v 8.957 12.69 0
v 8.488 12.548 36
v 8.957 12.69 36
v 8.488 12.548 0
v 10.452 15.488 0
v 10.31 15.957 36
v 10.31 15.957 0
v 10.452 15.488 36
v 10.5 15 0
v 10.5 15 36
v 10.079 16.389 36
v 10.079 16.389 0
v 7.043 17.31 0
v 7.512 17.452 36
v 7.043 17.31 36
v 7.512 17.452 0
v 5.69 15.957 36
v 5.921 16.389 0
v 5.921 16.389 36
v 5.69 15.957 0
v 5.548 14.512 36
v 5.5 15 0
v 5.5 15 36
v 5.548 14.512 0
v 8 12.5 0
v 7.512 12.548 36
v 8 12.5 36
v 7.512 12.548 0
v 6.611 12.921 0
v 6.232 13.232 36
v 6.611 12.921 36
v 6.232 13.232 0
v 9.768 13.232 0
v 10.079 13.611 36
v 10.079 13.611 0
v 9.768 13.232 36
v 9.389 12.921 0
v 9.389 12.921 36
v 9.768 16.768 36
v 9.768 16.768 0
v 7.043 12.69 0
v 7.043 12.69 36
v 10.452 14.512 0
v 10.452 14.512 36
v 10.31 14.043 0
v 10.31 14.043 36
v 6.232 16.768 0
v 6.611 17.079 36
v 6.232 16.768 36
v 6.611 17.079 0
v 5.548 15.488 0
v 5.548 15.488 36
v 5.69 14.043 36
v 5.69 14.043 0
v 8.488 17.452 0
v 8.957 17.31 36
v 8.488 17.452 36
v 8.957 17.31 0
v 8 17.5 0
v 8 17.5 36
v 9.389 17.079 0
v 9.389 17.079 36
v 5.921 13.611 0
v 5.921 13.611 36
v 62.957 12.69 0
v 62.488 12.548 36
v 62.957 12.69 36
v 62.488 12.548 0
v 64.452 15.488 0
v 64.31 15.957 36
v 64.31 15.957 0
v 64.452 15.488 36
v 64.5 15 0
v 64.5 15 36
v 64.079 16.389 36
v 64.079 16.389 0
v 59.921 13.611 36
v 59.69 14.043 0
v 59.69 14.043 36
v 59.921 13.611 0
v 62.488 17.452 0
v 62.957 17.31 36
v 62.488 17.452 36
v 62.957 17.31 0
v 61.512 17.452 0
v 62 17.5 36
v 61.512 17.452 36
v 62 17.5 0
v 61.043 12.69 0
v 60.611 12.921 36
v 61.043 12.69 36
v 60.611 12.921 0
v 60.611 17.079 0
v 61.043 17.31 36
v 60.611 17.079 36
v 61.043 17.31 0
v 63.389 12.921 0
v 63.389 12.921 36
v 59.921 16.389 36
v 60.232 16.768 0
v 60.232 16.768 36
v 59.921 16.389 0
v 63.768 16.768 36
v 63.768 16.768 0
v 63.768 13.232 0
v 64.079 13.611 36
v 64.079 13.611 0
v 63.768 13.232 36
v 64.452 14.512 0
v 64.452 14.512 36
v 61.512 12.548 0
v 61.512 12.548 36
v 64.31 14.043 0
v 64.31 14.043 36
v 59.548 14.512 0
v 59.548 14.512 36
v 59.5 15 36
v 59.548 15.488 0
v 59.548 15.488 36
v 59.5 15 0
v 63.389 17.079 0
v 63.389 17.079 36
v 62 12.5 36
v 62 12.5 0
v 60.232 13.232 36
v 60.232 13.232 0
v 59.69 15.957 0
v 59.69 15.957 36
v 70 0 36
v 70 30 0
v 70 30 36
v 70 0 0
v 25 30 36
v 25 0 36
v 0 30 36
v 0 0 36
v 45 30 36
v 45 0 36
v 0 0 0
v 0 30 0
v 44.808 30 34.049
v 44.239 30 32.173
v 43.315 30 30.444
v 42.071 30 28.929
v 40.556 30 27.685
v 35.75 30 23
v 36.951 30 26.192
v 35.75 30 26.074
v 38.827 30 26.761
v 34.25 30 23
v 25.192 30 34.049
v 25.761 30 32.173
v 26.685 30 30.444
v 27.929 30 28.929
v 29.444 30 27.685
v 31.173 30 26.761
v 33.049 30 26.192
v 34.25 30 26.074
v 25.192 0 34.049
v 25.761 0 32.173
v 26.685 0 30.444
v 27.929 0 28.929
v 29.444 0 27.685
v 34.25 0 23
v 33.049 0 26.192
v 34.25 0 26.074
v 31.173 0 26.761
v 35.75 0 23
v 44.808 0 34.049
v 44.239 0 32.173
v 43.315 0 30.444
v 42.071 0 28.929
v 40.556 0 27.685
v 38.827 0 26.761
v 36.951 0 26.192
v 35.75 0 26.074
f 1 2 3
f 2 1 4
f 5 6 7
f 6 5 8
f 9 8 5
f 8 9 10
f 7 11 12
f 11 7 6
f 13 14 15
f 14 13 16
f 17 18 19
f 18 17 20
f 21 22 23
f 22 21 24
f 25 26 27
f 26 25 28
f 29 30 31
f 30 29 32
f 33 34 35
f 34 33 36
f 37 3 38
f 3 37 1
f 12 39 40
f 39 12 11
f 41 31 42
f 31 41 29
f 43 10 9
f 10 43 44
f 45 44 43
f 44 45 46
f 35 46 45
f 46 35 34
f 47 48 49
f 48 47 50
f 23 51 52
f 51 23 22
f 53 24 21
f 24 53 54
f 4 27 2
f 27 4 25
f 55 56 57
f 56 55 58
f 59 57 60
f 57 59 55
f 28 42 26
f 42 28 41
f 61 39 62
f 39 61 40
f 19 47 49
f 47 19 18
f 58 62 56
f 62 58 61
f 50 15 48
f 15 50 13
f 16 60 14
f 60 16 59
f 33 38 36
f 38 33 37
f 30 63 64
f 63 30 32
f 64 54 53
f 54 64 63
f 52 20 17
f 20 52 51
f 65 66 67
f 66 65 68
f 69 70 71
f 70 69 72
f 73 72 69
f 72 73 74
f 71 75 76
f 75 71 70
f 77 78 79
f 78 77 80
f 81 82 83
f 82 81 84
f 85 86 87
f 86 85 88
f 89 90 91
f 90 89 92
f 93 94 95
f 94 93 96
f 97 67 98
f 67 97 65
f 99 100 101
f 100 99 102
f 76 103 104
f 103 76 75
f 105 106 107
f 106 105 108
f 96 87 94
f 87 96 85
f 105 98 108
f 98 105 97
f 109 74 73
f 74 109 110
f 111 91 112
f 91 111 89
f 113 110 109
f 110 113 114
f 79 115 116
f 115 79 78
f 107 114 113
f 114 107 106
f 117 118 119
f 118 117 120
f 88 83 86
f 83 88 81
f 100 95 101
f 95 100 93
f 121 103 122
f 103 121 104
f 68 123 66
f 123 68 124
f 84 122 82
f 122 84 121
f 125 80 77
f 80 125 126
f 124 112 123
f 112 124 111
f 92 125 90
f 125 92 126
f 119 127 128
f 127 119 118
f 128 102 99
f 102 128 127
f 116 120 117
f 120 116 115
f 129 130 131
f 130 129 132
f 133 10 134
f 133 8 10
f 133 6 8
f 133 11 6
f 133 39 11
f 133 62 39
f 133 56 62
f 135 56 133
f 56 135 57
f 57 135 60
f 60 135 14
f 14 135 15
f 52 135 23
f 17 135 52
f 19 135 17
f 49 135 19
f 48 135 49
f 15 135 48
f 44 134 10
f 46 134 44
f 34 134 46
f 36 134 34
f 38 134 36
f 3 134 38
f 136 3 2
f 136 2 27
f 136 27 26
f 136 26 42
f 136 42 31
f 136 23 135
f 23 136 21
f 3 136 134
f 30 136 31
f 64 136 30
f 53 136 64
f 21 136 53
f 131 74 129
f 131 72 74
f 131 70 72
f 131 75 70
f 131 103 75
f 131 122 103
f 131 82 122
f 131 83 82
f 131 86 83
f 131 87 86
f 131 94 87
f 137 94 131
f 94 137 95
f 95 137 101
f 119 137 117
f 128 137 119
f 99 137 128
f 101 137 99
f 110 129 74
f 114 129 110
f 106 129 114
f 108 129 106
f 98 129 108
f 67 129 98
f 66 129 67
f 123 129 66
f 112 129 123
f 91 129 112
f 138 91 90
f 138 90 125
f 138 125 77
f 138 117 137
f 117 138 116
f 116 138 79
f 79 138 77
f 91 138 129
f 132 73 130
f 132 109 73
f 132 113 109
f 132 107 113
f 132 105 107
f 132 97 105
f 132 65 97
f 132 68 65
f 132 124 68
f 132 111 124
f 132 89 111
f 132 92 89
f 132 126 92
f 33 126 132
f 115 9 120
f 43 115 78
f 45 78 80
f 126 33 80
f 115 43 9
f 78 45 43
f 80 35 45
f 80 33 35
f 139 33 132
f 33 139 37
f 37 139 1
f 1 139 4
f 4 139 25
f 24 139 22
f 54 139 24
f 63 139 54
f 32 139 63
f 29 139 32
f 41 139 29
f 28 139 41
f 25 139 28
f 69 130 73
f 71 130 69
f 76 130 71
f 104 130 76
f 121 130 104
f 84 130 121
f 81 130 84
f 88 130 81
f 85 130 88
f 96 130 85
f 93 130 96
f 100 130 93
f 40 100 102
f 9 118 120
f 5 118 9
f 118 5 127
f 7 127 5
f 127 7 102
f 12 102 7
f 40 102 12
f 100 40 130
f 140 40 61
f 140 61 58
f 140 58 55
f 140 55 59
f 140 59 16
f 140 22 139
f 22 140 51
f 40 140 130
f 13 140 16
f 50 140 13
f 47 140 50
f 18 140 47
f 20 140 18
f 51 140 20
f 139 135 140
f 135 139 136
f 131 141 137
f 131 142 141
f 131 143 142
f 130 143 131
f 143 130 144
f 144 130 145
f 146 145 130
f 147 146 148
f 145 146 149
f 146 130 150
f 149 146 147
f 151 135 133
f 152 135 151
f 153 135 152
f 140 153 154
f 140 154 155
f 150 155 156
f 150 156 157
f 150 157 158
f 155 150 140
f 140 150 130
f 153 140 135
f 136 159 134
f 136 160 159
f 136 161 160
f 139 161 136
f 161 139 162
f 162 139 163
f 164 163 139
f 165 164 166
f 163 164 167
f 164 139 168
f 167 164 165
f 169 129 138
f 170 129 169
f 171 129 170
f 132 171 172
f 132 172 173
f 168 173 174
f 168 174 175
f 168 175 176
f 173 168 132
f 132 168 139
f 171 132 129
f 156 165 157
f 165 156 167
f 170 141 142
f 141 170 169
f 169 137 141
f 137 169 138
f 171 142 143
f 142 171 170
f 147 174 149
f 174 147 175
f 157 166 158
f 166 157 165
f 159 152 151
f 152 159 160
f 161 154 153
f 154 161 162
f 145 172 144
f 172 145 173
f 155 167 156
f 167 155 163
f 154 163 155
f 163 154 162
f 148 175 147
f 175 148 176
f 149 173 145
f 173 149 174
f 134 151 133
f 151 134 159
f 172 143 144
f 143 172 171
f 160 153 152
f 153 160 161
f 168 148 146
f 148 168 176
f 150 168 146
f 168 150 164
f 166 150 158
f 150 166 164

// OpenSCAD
$fn = 32;

// ----------------------------------------------------------------------
// Saddle clamp: split shaft clamp
// ----------------------------------------------------------------------

// --- parameters (mm) ---
blk_l = 70;               // block length, X
blk_w = 30;               // block width, Y
blk_h = 36;               // block height
clamp_r = 10;             // shaft groove radius
hole_r = 2.5;             // bolt hole radius
hole_m = 8;               // bolt hole margin from the ends
saw_w = 1.5;              // saw kerf width

saw_depth = clamp_r + 3;  // saw kerf depth

difference() {
  cube([blk_l, blk_w, blk_h]);
  translate([blk_l / 2, -1, blk_h])
    rotate([-90, 0, 0])
      cylinder(h = blk_w + 2, r = clamp_r);
  for (sx = [0, 1])
    translate([sx ? blk_l - hole_m : hole_m, blk_w / 2, -1])
      cylinder(r = hole_r, h = blk_h + 2);
  translate([blk_l / 2 - saw_w / 2, -1, blk_h - saw_depth])
    cube([saw_w, blk_w + 2, saw_depth + 1]);
}
